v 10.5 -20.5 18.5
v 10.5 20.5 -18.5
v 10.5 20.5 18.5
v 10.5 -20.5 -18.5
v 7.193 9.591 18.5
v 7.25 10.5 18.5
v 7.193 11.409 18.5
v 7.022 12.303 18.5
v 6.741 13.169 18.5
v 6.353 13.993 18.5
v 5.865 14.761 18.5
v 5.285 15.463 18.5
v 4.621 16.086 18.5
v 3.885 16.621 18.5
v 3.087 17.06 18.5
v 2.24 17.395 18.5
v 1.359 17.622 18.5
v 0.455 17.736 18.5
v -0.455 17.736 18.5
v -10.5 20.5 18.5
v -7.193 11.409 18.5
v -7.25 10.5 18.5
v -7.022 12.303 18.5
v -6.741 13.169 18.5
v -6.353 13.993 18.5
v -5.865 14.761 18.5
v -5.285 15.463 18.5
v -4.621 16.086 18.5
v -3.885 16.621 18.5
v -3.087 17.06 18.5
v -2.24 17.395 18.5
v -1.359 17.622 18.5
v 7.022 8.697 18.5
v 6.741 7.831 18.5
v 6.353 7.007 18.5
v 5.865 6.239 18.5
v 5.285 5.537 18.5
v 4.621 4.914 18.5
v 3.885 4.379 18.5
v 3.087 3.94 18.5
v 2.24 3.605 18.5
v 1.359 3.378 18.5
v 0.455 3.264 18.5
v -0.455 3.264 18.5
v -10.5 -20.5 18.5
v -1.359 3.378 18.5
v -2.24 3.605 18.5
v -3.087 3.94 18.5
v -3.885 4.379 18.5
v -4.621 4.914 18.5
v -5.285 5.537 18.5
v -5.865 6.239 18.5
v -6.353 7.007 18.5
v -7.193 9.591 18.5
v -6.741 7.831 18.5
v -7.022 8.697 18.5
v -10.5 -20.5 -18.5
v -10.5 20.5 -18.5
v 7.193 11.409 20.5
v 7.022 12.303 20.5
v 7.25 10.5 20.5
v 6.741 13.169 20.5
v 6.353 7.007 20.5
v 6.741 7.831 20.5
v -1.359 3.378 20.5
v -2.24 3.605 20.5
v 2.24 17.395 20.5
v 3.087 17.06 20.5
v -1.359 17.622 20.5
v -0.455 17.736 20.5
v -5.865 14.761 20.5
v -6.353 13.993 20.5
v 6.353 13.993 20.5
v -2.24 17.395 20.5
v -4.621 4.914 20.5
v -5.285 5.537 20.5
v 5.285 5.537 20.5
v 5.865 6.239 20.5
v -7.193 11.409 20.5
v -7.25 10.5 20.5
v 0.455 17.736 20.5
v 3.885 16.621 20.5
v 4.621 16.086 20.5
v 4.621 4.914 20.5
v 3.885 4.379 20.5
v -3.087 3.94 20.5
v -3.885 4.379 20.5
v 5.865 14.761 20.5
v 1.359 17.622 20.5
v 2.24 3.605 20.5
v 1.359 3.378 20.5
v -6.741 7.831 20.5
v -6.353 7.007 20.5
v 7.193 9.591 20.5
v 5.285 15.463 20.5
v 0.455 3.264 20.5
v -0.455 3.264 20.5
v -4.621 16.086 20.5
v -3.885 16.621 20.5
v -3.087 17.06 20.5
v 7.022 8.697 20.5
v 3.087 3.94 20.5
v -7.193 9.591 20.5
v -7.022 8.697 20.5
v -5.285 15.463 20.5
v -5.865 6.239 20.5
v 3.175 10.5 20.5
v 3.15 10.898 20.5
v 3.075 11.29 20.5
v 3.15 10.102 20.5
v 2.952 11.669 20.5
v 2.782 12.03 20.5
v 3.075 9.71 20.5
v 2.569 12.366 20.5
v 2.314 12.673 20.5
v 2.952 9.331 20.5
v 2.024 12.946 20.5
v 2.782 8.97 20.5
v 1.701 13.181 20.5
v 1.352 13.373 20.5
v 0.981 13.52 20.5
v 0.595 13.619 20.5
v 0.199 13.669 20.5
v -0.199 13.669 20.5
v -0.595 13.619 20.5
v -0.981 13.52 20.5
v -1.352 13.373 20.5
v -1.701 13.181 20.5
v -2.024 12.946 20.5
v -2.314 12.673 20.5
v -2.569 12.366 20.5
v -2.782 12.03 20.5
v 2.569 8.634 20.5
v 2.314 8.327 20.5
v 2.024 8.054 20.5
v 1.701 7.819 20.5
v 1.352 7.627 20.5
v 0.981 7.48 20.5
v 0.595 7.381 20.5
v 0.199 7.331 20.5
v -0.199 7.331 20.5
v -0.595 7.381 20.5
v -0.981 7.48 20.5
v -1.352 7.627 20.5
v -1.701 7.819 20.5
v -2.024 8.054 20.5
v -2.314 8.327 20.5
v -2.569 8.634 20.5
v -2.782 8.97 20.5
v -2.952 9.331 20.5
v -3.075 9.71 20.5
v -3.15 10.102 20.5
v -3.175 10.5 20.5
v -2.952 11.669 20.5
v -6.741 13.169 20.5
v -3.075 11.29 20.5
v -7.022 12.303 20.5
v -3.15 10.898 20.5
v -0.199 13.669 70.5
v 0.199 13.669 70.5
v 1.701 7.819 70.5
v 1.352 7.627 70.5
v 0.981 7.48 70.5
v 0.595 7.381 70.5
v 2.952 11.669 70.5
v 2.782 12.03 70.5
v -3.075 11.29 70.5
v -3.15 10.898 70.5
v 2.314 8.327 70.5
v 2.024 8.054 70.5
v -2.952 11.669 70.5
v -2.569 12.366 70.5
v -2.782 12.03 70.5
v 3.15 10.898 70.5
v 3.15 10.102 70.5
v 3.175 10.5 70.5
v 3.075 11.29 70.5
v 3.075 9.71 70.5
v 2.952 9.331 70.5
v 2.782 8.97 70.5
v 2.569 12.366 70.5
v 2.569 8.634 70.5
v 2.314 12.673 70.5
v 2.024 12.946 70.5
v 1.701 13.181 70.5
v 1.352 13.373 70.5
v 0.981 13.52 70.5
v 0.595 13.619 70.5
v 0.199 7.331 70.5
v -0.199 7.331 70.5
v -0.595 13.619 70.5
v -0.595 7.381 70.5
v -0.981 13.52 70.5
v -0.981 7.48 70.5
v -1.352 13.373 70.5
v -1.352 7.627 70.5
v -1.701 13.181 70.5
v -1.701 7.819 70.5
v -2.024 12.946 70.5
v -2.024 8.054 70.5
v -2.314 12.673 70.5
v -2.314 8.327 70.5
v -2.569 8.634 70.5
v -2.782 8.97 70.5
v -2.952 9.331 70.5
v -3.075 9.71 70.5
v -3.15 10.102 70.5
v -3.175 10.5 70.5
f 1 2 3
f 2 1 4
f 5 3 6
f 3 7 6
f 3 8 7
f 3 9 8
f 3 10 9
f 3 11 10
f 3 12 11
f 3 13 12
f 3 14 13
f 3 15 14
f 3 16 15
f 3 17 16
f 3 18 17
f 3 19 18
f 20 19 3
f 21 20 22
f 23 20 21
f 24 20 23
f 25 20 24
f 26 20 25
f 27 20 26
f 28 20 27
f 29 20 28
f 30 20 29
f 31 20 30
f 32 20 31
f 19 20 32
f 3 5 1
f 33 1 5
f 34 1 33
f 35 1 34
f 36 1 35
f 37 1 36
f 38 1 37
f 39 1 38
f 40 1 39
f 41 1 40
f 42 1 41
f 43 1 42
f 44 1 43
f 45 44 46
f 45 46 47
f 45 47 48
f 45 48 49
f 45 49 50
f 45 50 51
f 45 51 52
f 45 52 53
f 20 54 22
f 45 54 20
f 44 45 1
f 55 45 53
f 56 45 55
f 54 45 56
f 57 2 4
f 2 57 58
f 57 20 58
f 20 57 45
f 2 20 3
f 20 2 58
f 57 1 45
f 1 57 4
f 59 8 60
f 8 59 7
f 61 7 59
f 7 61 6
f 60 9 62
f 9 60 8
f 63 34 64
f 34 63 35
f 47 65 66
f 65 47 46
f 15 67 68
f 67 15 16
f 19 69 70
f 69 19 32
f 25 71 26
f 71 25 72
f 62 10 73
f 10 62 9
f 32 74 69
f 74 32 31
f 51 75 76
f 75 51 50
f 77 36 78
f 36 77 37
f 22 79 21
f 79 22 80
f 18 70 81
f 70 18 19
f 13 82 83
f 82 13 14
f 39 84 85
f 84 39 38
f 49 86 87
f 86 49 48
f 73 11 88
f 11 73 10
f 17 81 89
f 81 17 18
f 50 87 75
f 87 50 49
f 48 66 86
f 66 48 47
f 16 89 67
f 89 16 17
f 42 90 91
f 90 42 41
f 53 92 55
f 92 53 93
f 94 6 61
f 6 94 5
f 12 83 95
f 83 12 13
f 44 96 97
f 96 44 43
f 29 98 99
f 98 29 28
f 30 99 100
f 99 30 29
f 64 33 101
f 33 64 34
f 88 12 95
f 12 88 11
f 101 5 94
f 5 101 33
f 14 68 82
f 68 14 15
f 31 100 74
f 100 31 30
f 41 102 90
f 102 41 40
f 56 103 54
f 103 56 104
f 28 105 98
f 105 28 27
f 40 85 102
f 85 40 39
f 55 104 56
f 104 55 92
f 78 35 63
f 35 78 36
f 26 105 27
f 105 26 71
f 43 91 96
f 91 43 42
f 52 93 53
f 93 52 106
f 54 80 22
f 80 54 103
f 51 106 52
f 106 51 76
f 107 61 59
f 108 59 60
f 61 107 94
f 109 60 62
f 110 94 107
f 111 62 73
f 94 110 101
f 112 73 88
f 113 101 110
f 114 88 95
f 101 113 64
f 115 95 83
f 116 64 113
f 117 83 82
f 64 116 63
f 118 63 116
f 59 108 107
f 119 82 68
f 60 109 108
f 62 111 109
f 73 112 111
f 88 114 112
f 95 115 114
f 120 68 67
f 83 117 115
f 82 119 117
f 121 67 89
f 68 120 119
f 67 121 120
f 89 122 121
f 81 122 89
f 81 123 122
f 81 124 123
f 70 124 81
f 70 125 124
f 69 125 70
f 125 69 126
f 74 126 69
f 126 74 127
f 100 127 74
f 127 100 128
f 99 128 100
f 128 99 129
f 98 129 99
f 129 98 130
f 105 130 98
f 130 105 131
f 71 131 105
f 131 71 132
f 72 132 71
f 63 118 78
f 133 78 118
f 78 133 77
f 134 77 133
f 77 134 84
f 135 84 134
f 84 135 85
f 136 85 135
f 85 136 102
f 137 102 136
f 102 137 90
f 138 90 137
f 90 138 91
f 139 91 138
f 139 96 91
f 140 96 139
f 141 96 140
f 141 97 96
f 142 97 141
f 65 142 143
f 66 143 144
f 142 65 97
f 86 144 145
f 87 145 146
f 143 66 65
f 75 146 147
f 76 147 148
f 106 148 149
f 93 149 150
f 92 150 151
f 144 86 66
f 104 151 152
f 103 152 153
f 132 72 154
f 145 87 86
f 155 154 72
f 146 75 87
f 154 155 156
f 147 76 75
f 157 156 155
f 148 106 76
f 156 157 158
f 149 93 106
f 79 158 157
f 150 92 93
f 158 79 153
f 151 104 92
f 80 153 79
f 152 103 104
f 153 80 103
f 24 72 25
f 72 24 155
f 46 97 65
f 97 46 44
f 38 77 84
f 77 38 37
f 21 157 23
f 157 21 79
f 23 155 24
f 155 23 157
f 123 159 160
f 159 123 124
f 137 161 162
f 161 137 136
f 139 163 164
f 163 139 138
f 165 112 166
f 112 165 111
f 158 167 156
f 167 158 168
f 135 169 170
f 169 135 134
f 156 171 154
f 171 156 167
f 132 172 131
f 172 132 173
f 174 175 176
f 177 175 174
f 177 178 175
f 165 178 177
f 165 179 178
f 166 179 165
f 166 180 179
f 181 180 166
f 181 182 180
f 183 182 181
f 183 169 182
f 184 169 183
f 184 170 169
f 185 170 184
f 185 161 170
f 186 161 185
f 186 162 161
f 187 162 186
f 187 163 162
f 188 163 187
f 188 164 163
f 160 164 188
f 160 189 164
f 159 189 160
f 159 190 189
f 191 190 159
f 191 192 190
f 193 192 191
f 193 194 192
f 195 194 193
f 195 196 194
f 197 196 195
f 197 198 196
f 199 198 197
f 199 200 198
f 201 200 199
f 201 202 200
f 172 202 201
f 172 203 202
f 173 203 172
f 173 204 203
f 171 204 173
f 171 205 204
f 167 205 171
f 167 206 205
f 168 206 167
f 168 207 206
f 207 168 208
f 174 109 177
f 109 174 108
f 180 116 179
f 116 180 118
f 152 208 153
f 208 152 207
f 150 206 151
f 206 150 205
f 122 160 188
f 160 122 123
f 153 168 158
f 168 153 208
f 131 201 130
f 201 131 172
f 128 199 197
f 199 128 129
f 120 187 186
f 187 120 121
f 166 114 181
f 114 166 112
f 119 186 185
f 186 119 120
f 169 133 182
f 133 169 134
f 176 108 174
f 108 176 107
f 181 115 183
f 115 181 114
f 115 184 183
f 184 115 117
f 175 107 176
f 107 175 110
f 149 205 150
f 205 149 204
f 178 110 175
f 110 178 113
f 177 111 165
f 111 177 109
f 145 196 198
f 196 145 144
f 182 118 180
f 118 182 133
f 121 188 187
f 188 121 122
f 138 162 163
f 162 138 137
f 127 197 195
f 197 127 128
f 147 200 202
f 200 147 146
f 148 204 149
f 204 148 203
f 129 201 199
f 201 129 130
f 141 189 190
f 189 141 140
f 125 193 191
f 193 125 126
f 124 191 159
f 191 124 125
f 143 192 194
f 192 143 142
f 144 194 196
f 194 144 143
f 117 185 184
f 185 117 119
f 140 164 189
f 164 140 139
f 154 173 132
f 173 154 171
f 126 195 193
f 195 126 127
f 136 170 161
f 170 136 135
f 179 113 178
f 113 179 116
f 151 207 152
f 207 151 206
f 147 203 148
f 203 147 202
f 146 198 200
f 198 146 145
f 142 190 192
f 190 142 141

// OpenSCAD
// file: calcs.scad
include <inputs.scad>

// CALCS (everything ends up in [mm])
robot_height = robot_height_in*cu-height_edge*cu*2; // height of the robot
robot_width = robot_width_in*cu-side_edge*cu*2; // width of the robot

base_bottom = base_clearance*cu; // height of the bottom of the base
base_top = base_bottom + base_thickness; // height of the top of the base

storage_size = storage_width*cu; // inside depth of storage area
storage_height = robot_height-base_top; // height of storage container
wire_hole = wire_hole_in*cu; // diameter of hole for wires under storage area

dump_height = dump_height_in*cu; // height that platform edge will raise to dump

shaft_width = robot_width - 2*storage_size - 2*thickness; // inside width of elevator shaft


cut_size = (robot_height-dump_height-base_top)/2+tol; // size of vertical cut for sliding together

shift = shaft_width/2 + thickness/2; // how much the pieces need to be shifted to be put together


wheel_opening_width = wheel_d; // width of opening for wheels on sub base
wheel_opening_depth = wheel_w + wheel_opening_depth_tol; // width of opening for wheels on sub base

drive_height = max(mount_motor_hole_offset,wheel_d/2) + max(mount_motor_hole_offset-mount_motor_hole_offset,wheel_d/2); // height of wheel, motor, and mount

sbase_top_height = drive_height + sbase_thickness; // height of the top of the sub base


false_bottom_height = false_bottom_height_in*cu; // height of false bottom in front

false_opening_height = false_opening_height_in*cu; // height of hole for false bottom


cut_height = base_bottom + false_opening_height - base_thickness; // height at which cuts will meet

bottom_cut_height = cut_height - base_top + tol; // height of bottom cut

top_cut_height = robot_height - dump_height - cut_height + tol; // height of top cut

el_step_height = el_step_height_in*cu; // height of steppers for elevator

// Checking
if (shaft_width < storage_size)
{
    echo("<b>THE STORAGE AREAS WILL BE TOO NARROW!!!!!!!!!!!!!!!!!!!!!!!!!!");
    echo("THIS IS A PROBLEM!!!!!!!!!!!!!!!!!!!!!!!!!!");
    echo("Width: ", shaft_width/cu, "[in]");
}
else
{
    echo("<b>Storage width will be:", shaft_width/cu, "[in]</b>");
}

echo("<b>Corner Size:", (robot_width-shaft_width-2*thickness)/2/cu, "[in]</b>");

// error check for sbase and base
if (sbase_top_height >= base_bottom)
{
    echo("<b>SUB BASE TOO TALL!!!!!!!!!!!!!!!!!!!!!!!!!!</b>");
}
else
{
    echo("<b>Spacer height should be:", (base_bottom - sbase_top_height)/cu, "[in]</b>");
}


echo(shaft_width/cu);
echo(storage_size/cu);
// file: inputs.scad
$fn = 50;
cu = 25.4; // inch -> mm

// INPUTS
thickness = 2; // thickness of the acrylic [mm]
base_thickness = 5; // thickness of the base acrylic [mm]

side_edge = 0.25; // clearance for each side of the robot [in]
height_edge = 0.1; // clearance for top and bottom of the robot [in]

robot_height_in = 11; // overall height of the robot [in]
robot_width_in = 9; // overall width of the robot [in]

base_clearance = 2.65; // clearance of the base to ground [in]

storage_width = 2.65; // inside width of storage container [in]

block_width = 5; // width of jigsaw block [mm]

dump_height_in = 1.75; // height that platform edge will raise to dump [in]

tol = 0.001; // number used to fix rounding? [mm]


sbase_thickness = 0; // thickness of the sub base [mm]

wheel_opening_depth_tol = 5; // extra space for wheel depth [mm]

hole_dist_opposing = 33.98; // distance between middles of opposing mounting holes [mm]

hole_dist_adjacent = 6.36; // distance between middles of adjacent mounting holes [mm]

hole_diameter = 3.26; // diameter of mounting holes [mm]

hole_in_spacing = 5; // distance from edge to middle of first mount holes [mm]


servo_length = 41; // lenght of servo [mm]

servo_width = 21; // width of servo [mm]

servo_depth = 37; // height of servo to top plate [mm]

servo_mount_length = 7; // length of servo hole mount (one side) [mm]

servo_wire_clear_length = 12; // length wires protrude from side [mm]

servo_circle_d = 14.5; // diameter of circular protrusion around spline [mm]

servo_circle_offset = 10; // distance from one side to center of spline [mm]


stepper_depth = 40; // depth of stepper [mm]

stepper_lw = 42; // length/width of stepper [mm]

stepper_shaft_ext = 23; // extension of stepper shaft from face [mm]

s_shaft_d = 5; // stepper shaft diameter [mm]

mount_width = 50; // width of motor mount [mm]

mount_mount_hole_offset_w = 15; // distance from center to mount holes for motor mount [mm]

mount_mount_hole_offset_from_back = 11; // distance from back to first mount holes for motor mount [mm]

mount_mount_hole_differential = 30; // distance from first mount hole to second mount hole for motor mount [mm]

mount_mount_hole_d = 4.2; // diameter of mount mount hole[mm]

mount_motor_hole_offset = 31; // distance from top of mount to center of motor hole [mm]

mount_motor_hole_d = 22.1; // diameter of motor hole in mount [mm]

mount_length = 53.5; // length of motor mount [mm]

mount_depth = 51.5; // depth of motor mount [mm]

mount_thickness = 3; // thickness of metal for mount [mm]

wheel_d = 60; // diameter of wheel [mm]

wheel_w = 31; // width of wheel [mm]

wheel_out = 17; // how far out the shaft the wheel starts [mm]

wedge_tol = 1; // tolerance for edges of wedge [mm]

wedge_angle = 30; // angle of wedge from horizontal [deg]

wedge_thickness = 5; // thickness of wedge [mm]


wire_hole_in = 0.5; // size of hole for wires to motors

wire_tri_edge = 5; // thickness of edge on wiring triangle [mm]

false_bottom_height_in = 3; // height of false bottom in front [in]

bottom_clearance = 3; // clearance for walls on bottom of robot [mm]

false_opening_height_in = 3; // height of hole for false bottom [in]


el_step_height_in = 2; // height of steppers for elevator [in]

el_motor_size = 35; // length of elevator stepper motor [mm]

bracket_thickness = 3; // thickness of bracket for elevator stepper [mm]
// main file
include <inputs.scad>
include <calcs.scad>

module servo(connectors)
{
    union()
    {
        cube(size = [servo_width, servo_length, servo_depth], center = true);
        if (connectors)
        {
            for (ii = [-1,1])
            {
                translate(v = [0, ii*(servo_length+servo_mount_length)/2, servo_depth/2-8])
                {
                    cube(size = [servo_width, servo_mount_length, 4],center = true);
                }
            }
        }
        translate(v = [0, servo_length/2-servo_circle_offset,servo_depth/2])
        {
            cylinder(h = 2*thickness, d = servo_circle_d, center = true);
        }
        
        translate(v = [0, servo_length/2-servo_circle_offset,servo_depth/2+thickness])
        {
            cylinder(h = 50, d = 0.25*cu, center = false);
        }
    }
}

servo();
